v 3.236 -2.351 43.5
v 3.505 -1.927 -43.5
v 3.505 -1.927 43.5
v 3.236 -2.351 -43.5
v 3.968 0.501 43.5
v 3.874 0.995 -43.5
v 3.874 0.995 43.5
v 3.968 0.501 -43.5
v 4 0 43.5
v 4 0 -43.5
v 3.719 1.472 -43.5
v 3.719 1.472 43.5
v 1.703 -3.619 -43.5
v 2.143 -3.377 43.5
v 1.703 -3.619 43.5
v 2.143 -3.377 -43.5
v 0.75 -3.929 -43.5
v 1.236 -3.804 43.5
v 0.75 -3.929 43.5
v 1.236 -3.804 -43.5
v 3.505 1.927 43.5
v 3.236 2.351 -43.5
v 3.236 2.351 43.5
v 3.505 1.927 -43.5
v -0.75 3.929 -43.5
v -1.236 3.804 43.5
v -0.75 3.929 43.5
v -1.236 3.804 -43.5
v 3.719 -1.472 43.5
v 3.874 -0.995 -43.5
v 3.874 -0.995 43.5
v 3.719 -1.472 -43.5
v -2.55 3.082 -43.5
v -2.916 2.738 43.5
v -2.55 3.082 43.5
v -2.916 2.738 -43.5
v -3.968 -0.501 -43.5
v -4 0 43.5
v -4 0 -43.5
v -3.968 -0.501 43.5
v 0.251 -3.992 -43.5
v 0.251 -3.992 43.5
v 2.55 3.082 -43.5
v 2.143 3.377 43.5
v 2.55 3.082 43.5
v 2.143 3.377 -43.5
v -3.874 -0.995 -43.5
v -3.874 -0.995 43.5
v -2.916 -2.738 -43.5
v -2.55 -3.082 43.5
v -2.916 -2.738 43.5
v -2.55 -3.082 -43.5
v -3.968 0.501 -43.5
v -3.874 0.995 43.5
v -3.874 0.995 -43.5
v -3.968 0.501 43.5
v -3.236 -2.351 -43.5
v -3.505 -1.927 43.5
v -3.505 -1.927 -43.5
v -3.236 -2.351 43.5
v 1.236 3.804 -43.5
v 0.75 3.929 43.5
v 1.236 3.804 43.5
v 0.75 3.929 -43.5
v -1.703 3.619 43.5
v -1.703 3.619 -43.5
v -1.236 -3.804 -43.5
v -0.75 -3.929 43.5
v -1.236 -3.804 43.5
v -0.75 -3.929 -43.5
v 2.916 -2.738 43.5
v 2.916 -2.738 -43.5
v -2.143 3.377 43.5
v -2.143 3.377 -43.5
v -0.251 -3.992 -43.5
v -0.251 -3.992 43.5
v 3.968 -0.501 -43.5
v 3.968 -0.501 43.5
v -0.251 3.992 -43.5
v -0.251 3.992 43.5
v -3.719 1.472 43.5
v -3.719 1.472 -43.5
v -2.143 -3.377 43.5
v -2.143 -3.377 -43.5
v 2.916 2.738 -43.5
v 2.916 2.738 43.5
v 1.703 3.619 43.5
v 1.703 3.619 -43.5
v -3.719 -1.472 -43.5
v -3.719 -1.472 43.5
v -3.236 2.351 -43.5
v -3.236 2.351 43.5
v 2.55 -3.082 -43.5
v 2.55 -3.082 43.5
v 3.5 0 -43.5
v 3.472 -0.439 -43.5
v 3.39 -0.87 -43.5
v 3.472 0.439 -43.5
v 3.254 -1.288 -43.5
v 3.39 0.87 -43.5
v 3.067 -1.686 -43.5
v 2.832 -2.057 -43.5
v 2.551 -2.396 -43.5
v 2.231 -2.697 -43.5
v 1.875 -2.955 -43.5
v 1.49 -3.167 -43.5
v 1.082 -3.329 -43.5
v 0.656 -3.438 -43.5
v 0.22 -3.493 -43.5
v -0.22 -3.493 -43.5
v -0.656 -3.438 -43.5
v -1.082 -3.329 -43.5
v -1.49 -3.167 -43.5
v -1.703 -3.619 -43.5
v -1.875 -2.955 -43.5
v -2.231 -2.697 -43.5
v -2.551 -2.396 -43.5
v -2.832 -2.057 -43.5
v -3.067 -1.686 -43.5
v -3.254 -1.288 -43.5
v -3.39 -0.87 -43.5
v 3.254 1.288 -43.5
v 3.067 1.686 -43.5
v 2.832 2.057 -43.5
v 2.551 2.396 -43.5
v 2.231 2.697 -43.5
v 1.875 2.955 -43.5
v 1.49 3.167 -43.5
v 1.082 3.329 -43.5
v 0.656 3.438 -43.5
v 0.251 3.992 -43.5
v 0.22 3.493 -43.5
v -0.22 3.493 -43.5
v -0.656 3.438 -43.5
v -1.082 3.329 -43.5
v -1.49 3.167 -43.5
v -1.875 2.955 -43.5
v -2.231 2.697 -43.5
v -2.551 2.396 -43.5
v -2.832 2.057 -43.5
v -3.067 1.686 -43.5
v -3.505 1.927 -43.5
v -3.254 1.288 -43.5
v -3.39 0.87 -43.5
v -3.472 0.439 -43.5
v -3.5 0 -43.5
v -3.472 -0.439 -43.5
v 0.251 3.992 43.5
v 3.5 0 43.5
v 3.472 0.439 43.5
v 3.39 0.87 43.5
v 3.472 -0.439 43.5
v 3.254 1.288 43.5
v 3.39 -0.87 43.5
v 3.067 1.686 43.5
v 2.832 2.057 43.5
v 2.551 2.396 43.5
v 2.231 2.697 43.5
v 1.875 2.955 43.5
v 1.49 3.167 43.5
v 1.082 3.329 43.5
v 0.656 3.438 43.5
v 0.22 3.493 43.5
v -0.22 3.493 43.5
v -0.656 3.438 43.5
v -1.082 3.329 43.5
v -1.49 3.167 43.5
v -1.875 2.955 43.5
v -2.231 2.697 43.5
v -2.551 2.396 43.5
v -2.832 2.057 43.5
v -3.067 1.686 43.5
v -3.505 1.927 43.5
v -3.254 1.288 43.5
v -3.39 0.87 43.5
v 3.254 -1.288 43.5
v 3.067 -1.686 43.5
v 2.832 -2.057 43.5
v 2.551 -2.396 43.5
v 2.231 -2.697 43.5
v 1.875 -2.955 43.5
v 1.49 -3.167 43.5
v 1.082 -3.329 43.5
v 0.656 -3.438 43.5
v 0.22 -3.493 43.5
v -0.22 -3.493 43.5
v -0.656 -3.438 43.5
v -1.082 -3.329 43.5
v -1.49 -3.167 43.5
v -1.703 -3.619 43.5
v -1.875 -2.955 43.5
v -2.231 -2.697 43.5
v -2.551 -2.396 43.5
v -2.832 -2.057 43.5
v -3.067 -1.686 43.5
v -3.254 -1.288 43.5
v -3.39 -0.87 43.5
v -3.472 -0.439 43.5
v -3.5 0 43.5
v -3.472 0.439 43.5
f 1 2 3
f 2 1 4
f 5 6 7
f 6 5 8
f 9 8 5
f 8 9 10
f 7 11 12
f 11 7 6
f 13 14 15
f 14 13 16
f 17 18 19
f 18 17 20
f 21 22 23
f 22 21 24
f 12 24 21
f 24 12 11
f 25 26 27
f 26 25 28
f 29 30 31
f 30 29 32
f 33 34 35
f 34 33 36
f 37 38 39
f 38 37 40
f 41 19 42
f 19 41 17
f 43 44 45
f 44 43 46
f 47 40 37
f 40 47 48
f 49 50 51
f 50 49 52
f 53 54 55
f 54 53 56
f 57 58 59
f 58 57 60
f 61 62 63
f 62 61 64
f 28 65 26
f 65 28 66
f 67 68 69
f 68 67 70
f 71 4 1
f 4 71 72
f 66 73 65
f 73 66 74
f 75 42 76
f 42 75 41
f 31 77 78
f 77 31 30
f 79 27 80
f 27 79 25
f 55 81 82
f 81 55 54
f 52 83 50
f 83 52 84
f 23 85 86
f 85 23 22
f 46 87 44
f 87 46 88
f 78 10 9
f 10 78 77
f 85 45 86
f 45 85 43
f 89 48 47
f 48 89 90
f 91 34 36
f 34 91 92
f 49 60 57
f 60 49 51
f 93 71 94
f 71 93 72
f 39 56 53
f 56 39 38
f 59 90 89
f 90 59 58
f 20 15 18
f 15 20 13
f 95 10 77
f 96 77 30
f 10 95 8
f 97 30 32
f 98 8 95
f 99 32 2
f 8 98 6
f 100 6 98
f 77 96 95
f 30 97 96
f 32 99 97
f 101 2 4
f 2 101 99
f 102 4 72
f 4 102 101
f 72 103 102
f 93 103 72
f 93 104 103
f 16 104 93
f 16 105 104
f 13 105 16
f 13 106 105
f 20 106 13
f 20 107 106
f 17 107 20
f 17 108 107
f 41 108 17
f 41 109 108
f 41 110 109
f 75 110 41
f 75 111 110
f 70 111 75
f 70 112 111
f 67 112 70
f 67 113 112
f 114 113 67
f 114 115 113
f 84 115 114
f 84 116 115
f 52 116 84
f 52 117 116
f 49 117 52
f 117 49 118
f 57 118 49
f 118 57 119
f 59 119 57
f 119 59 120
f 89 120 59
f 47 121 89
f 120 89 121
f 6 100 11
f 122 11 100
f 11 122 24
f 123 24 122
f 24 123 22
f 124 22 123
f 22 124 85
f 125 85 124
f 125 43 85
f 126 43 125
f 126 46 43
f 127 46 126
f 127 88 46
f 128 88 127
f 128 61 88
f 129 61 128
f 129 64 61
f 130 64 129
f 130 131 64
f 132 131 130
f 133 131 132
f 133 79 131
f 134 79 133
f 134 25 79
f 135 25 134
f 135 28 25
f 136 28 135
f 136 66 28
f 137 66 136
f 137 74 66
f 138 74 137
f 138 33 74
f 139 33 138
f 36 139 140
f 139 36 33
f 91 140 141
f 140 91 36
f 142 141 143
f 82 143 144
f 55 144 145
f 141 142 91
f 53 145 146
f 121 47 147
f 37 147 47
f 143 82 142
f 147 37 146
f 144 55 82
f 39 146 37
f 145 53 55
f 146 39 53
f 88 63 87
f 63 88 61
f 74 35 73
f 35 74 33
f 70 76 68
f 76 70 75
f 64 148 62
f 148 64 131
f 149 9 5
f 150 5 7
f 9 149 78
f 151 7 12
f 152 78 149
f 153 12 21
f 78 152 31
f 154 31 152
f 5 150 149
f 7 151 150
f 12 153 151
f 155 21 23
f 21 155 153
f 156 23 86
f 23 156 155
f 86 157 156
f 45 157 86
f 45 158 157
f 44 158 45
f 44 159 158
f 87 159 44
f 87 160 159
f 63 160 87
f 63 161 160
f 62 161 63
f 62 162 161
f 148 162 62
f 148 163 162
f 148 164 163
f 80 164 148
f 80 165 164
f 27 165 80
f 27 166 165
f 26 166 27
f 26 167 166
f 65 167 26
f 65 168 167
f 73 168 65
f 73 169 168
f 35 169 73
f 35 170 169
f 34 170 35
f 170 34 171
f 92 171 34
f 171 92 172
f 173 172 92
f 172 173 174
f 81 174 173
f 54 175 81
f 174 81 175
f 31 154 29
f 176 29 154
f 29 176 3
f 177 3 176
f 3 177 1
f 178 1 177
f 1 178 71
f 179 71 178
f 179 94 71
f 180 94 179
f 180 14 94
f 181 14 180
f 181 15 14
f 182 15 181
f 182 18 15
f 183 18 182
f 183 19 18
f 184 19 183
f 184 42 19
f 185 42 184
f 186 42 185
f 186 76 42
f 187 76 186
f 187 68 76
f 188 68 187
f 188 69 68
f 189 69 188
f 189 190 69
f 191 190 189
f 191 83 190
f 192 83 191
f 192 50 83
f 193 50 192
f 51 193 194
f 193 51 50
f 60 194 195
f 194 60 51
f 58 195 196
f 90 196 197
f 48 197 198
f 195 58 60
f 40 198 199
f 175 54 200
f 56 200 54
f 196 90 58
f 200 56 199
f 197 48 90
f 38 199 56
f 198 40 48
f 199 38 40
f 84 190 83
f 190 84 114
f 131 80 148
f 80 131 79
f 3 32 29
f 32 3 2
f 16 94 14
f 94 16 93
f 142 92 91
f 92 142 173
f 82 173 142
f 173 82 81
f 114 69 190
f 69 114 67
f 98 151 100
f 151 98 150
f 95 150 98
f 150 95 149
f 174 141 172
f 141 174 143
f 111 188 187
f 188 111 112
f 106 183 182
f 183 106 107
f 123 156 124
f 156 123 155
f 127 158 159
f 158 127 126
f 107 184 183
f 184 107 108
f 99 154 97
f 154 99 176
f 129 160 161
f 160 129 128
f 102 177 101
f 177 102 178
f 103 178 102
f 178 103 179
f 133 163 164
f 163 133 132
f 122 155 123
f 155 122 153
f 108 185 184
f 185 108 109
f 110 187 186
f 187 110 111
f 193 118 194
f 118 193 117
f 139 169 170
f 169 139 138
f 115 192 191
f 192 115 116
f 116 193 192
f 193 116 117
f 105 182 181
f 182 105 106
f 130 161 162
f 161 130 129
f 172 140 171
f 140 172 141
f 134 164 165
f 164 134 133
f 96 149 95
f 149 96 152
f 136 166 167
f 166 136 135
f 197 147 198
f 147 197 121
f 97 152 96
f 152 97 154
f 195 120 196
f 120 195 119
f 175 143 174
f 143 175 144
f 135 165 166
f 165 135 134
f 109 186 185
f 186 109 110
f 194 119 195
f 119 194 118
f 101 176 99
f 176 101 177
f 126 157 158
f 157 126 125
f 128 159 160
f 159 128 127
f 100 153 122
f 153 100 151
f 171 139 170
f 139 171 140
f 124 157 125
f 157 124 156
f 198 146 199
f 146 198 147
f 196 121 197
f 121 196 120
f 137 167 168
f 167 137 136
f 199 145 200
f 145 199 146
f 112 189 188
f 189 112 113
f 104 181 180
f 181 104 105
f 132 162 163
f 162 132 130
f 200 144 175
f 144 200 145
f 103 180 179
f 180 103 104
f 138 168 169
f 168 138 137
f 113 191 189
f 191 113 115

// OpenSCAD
$fn = 50;


difference() {
	union() {
		translate(v = [0, 0, -43.5000000000]) {
			cylinder(h = 87, r = 4.0000000000);
		}
	}
	union() {
		translate(v = [0, 0, -100.0000000000]) {
			cylinder(h = 200, r = 3.5000000000);
		}
	}
}
